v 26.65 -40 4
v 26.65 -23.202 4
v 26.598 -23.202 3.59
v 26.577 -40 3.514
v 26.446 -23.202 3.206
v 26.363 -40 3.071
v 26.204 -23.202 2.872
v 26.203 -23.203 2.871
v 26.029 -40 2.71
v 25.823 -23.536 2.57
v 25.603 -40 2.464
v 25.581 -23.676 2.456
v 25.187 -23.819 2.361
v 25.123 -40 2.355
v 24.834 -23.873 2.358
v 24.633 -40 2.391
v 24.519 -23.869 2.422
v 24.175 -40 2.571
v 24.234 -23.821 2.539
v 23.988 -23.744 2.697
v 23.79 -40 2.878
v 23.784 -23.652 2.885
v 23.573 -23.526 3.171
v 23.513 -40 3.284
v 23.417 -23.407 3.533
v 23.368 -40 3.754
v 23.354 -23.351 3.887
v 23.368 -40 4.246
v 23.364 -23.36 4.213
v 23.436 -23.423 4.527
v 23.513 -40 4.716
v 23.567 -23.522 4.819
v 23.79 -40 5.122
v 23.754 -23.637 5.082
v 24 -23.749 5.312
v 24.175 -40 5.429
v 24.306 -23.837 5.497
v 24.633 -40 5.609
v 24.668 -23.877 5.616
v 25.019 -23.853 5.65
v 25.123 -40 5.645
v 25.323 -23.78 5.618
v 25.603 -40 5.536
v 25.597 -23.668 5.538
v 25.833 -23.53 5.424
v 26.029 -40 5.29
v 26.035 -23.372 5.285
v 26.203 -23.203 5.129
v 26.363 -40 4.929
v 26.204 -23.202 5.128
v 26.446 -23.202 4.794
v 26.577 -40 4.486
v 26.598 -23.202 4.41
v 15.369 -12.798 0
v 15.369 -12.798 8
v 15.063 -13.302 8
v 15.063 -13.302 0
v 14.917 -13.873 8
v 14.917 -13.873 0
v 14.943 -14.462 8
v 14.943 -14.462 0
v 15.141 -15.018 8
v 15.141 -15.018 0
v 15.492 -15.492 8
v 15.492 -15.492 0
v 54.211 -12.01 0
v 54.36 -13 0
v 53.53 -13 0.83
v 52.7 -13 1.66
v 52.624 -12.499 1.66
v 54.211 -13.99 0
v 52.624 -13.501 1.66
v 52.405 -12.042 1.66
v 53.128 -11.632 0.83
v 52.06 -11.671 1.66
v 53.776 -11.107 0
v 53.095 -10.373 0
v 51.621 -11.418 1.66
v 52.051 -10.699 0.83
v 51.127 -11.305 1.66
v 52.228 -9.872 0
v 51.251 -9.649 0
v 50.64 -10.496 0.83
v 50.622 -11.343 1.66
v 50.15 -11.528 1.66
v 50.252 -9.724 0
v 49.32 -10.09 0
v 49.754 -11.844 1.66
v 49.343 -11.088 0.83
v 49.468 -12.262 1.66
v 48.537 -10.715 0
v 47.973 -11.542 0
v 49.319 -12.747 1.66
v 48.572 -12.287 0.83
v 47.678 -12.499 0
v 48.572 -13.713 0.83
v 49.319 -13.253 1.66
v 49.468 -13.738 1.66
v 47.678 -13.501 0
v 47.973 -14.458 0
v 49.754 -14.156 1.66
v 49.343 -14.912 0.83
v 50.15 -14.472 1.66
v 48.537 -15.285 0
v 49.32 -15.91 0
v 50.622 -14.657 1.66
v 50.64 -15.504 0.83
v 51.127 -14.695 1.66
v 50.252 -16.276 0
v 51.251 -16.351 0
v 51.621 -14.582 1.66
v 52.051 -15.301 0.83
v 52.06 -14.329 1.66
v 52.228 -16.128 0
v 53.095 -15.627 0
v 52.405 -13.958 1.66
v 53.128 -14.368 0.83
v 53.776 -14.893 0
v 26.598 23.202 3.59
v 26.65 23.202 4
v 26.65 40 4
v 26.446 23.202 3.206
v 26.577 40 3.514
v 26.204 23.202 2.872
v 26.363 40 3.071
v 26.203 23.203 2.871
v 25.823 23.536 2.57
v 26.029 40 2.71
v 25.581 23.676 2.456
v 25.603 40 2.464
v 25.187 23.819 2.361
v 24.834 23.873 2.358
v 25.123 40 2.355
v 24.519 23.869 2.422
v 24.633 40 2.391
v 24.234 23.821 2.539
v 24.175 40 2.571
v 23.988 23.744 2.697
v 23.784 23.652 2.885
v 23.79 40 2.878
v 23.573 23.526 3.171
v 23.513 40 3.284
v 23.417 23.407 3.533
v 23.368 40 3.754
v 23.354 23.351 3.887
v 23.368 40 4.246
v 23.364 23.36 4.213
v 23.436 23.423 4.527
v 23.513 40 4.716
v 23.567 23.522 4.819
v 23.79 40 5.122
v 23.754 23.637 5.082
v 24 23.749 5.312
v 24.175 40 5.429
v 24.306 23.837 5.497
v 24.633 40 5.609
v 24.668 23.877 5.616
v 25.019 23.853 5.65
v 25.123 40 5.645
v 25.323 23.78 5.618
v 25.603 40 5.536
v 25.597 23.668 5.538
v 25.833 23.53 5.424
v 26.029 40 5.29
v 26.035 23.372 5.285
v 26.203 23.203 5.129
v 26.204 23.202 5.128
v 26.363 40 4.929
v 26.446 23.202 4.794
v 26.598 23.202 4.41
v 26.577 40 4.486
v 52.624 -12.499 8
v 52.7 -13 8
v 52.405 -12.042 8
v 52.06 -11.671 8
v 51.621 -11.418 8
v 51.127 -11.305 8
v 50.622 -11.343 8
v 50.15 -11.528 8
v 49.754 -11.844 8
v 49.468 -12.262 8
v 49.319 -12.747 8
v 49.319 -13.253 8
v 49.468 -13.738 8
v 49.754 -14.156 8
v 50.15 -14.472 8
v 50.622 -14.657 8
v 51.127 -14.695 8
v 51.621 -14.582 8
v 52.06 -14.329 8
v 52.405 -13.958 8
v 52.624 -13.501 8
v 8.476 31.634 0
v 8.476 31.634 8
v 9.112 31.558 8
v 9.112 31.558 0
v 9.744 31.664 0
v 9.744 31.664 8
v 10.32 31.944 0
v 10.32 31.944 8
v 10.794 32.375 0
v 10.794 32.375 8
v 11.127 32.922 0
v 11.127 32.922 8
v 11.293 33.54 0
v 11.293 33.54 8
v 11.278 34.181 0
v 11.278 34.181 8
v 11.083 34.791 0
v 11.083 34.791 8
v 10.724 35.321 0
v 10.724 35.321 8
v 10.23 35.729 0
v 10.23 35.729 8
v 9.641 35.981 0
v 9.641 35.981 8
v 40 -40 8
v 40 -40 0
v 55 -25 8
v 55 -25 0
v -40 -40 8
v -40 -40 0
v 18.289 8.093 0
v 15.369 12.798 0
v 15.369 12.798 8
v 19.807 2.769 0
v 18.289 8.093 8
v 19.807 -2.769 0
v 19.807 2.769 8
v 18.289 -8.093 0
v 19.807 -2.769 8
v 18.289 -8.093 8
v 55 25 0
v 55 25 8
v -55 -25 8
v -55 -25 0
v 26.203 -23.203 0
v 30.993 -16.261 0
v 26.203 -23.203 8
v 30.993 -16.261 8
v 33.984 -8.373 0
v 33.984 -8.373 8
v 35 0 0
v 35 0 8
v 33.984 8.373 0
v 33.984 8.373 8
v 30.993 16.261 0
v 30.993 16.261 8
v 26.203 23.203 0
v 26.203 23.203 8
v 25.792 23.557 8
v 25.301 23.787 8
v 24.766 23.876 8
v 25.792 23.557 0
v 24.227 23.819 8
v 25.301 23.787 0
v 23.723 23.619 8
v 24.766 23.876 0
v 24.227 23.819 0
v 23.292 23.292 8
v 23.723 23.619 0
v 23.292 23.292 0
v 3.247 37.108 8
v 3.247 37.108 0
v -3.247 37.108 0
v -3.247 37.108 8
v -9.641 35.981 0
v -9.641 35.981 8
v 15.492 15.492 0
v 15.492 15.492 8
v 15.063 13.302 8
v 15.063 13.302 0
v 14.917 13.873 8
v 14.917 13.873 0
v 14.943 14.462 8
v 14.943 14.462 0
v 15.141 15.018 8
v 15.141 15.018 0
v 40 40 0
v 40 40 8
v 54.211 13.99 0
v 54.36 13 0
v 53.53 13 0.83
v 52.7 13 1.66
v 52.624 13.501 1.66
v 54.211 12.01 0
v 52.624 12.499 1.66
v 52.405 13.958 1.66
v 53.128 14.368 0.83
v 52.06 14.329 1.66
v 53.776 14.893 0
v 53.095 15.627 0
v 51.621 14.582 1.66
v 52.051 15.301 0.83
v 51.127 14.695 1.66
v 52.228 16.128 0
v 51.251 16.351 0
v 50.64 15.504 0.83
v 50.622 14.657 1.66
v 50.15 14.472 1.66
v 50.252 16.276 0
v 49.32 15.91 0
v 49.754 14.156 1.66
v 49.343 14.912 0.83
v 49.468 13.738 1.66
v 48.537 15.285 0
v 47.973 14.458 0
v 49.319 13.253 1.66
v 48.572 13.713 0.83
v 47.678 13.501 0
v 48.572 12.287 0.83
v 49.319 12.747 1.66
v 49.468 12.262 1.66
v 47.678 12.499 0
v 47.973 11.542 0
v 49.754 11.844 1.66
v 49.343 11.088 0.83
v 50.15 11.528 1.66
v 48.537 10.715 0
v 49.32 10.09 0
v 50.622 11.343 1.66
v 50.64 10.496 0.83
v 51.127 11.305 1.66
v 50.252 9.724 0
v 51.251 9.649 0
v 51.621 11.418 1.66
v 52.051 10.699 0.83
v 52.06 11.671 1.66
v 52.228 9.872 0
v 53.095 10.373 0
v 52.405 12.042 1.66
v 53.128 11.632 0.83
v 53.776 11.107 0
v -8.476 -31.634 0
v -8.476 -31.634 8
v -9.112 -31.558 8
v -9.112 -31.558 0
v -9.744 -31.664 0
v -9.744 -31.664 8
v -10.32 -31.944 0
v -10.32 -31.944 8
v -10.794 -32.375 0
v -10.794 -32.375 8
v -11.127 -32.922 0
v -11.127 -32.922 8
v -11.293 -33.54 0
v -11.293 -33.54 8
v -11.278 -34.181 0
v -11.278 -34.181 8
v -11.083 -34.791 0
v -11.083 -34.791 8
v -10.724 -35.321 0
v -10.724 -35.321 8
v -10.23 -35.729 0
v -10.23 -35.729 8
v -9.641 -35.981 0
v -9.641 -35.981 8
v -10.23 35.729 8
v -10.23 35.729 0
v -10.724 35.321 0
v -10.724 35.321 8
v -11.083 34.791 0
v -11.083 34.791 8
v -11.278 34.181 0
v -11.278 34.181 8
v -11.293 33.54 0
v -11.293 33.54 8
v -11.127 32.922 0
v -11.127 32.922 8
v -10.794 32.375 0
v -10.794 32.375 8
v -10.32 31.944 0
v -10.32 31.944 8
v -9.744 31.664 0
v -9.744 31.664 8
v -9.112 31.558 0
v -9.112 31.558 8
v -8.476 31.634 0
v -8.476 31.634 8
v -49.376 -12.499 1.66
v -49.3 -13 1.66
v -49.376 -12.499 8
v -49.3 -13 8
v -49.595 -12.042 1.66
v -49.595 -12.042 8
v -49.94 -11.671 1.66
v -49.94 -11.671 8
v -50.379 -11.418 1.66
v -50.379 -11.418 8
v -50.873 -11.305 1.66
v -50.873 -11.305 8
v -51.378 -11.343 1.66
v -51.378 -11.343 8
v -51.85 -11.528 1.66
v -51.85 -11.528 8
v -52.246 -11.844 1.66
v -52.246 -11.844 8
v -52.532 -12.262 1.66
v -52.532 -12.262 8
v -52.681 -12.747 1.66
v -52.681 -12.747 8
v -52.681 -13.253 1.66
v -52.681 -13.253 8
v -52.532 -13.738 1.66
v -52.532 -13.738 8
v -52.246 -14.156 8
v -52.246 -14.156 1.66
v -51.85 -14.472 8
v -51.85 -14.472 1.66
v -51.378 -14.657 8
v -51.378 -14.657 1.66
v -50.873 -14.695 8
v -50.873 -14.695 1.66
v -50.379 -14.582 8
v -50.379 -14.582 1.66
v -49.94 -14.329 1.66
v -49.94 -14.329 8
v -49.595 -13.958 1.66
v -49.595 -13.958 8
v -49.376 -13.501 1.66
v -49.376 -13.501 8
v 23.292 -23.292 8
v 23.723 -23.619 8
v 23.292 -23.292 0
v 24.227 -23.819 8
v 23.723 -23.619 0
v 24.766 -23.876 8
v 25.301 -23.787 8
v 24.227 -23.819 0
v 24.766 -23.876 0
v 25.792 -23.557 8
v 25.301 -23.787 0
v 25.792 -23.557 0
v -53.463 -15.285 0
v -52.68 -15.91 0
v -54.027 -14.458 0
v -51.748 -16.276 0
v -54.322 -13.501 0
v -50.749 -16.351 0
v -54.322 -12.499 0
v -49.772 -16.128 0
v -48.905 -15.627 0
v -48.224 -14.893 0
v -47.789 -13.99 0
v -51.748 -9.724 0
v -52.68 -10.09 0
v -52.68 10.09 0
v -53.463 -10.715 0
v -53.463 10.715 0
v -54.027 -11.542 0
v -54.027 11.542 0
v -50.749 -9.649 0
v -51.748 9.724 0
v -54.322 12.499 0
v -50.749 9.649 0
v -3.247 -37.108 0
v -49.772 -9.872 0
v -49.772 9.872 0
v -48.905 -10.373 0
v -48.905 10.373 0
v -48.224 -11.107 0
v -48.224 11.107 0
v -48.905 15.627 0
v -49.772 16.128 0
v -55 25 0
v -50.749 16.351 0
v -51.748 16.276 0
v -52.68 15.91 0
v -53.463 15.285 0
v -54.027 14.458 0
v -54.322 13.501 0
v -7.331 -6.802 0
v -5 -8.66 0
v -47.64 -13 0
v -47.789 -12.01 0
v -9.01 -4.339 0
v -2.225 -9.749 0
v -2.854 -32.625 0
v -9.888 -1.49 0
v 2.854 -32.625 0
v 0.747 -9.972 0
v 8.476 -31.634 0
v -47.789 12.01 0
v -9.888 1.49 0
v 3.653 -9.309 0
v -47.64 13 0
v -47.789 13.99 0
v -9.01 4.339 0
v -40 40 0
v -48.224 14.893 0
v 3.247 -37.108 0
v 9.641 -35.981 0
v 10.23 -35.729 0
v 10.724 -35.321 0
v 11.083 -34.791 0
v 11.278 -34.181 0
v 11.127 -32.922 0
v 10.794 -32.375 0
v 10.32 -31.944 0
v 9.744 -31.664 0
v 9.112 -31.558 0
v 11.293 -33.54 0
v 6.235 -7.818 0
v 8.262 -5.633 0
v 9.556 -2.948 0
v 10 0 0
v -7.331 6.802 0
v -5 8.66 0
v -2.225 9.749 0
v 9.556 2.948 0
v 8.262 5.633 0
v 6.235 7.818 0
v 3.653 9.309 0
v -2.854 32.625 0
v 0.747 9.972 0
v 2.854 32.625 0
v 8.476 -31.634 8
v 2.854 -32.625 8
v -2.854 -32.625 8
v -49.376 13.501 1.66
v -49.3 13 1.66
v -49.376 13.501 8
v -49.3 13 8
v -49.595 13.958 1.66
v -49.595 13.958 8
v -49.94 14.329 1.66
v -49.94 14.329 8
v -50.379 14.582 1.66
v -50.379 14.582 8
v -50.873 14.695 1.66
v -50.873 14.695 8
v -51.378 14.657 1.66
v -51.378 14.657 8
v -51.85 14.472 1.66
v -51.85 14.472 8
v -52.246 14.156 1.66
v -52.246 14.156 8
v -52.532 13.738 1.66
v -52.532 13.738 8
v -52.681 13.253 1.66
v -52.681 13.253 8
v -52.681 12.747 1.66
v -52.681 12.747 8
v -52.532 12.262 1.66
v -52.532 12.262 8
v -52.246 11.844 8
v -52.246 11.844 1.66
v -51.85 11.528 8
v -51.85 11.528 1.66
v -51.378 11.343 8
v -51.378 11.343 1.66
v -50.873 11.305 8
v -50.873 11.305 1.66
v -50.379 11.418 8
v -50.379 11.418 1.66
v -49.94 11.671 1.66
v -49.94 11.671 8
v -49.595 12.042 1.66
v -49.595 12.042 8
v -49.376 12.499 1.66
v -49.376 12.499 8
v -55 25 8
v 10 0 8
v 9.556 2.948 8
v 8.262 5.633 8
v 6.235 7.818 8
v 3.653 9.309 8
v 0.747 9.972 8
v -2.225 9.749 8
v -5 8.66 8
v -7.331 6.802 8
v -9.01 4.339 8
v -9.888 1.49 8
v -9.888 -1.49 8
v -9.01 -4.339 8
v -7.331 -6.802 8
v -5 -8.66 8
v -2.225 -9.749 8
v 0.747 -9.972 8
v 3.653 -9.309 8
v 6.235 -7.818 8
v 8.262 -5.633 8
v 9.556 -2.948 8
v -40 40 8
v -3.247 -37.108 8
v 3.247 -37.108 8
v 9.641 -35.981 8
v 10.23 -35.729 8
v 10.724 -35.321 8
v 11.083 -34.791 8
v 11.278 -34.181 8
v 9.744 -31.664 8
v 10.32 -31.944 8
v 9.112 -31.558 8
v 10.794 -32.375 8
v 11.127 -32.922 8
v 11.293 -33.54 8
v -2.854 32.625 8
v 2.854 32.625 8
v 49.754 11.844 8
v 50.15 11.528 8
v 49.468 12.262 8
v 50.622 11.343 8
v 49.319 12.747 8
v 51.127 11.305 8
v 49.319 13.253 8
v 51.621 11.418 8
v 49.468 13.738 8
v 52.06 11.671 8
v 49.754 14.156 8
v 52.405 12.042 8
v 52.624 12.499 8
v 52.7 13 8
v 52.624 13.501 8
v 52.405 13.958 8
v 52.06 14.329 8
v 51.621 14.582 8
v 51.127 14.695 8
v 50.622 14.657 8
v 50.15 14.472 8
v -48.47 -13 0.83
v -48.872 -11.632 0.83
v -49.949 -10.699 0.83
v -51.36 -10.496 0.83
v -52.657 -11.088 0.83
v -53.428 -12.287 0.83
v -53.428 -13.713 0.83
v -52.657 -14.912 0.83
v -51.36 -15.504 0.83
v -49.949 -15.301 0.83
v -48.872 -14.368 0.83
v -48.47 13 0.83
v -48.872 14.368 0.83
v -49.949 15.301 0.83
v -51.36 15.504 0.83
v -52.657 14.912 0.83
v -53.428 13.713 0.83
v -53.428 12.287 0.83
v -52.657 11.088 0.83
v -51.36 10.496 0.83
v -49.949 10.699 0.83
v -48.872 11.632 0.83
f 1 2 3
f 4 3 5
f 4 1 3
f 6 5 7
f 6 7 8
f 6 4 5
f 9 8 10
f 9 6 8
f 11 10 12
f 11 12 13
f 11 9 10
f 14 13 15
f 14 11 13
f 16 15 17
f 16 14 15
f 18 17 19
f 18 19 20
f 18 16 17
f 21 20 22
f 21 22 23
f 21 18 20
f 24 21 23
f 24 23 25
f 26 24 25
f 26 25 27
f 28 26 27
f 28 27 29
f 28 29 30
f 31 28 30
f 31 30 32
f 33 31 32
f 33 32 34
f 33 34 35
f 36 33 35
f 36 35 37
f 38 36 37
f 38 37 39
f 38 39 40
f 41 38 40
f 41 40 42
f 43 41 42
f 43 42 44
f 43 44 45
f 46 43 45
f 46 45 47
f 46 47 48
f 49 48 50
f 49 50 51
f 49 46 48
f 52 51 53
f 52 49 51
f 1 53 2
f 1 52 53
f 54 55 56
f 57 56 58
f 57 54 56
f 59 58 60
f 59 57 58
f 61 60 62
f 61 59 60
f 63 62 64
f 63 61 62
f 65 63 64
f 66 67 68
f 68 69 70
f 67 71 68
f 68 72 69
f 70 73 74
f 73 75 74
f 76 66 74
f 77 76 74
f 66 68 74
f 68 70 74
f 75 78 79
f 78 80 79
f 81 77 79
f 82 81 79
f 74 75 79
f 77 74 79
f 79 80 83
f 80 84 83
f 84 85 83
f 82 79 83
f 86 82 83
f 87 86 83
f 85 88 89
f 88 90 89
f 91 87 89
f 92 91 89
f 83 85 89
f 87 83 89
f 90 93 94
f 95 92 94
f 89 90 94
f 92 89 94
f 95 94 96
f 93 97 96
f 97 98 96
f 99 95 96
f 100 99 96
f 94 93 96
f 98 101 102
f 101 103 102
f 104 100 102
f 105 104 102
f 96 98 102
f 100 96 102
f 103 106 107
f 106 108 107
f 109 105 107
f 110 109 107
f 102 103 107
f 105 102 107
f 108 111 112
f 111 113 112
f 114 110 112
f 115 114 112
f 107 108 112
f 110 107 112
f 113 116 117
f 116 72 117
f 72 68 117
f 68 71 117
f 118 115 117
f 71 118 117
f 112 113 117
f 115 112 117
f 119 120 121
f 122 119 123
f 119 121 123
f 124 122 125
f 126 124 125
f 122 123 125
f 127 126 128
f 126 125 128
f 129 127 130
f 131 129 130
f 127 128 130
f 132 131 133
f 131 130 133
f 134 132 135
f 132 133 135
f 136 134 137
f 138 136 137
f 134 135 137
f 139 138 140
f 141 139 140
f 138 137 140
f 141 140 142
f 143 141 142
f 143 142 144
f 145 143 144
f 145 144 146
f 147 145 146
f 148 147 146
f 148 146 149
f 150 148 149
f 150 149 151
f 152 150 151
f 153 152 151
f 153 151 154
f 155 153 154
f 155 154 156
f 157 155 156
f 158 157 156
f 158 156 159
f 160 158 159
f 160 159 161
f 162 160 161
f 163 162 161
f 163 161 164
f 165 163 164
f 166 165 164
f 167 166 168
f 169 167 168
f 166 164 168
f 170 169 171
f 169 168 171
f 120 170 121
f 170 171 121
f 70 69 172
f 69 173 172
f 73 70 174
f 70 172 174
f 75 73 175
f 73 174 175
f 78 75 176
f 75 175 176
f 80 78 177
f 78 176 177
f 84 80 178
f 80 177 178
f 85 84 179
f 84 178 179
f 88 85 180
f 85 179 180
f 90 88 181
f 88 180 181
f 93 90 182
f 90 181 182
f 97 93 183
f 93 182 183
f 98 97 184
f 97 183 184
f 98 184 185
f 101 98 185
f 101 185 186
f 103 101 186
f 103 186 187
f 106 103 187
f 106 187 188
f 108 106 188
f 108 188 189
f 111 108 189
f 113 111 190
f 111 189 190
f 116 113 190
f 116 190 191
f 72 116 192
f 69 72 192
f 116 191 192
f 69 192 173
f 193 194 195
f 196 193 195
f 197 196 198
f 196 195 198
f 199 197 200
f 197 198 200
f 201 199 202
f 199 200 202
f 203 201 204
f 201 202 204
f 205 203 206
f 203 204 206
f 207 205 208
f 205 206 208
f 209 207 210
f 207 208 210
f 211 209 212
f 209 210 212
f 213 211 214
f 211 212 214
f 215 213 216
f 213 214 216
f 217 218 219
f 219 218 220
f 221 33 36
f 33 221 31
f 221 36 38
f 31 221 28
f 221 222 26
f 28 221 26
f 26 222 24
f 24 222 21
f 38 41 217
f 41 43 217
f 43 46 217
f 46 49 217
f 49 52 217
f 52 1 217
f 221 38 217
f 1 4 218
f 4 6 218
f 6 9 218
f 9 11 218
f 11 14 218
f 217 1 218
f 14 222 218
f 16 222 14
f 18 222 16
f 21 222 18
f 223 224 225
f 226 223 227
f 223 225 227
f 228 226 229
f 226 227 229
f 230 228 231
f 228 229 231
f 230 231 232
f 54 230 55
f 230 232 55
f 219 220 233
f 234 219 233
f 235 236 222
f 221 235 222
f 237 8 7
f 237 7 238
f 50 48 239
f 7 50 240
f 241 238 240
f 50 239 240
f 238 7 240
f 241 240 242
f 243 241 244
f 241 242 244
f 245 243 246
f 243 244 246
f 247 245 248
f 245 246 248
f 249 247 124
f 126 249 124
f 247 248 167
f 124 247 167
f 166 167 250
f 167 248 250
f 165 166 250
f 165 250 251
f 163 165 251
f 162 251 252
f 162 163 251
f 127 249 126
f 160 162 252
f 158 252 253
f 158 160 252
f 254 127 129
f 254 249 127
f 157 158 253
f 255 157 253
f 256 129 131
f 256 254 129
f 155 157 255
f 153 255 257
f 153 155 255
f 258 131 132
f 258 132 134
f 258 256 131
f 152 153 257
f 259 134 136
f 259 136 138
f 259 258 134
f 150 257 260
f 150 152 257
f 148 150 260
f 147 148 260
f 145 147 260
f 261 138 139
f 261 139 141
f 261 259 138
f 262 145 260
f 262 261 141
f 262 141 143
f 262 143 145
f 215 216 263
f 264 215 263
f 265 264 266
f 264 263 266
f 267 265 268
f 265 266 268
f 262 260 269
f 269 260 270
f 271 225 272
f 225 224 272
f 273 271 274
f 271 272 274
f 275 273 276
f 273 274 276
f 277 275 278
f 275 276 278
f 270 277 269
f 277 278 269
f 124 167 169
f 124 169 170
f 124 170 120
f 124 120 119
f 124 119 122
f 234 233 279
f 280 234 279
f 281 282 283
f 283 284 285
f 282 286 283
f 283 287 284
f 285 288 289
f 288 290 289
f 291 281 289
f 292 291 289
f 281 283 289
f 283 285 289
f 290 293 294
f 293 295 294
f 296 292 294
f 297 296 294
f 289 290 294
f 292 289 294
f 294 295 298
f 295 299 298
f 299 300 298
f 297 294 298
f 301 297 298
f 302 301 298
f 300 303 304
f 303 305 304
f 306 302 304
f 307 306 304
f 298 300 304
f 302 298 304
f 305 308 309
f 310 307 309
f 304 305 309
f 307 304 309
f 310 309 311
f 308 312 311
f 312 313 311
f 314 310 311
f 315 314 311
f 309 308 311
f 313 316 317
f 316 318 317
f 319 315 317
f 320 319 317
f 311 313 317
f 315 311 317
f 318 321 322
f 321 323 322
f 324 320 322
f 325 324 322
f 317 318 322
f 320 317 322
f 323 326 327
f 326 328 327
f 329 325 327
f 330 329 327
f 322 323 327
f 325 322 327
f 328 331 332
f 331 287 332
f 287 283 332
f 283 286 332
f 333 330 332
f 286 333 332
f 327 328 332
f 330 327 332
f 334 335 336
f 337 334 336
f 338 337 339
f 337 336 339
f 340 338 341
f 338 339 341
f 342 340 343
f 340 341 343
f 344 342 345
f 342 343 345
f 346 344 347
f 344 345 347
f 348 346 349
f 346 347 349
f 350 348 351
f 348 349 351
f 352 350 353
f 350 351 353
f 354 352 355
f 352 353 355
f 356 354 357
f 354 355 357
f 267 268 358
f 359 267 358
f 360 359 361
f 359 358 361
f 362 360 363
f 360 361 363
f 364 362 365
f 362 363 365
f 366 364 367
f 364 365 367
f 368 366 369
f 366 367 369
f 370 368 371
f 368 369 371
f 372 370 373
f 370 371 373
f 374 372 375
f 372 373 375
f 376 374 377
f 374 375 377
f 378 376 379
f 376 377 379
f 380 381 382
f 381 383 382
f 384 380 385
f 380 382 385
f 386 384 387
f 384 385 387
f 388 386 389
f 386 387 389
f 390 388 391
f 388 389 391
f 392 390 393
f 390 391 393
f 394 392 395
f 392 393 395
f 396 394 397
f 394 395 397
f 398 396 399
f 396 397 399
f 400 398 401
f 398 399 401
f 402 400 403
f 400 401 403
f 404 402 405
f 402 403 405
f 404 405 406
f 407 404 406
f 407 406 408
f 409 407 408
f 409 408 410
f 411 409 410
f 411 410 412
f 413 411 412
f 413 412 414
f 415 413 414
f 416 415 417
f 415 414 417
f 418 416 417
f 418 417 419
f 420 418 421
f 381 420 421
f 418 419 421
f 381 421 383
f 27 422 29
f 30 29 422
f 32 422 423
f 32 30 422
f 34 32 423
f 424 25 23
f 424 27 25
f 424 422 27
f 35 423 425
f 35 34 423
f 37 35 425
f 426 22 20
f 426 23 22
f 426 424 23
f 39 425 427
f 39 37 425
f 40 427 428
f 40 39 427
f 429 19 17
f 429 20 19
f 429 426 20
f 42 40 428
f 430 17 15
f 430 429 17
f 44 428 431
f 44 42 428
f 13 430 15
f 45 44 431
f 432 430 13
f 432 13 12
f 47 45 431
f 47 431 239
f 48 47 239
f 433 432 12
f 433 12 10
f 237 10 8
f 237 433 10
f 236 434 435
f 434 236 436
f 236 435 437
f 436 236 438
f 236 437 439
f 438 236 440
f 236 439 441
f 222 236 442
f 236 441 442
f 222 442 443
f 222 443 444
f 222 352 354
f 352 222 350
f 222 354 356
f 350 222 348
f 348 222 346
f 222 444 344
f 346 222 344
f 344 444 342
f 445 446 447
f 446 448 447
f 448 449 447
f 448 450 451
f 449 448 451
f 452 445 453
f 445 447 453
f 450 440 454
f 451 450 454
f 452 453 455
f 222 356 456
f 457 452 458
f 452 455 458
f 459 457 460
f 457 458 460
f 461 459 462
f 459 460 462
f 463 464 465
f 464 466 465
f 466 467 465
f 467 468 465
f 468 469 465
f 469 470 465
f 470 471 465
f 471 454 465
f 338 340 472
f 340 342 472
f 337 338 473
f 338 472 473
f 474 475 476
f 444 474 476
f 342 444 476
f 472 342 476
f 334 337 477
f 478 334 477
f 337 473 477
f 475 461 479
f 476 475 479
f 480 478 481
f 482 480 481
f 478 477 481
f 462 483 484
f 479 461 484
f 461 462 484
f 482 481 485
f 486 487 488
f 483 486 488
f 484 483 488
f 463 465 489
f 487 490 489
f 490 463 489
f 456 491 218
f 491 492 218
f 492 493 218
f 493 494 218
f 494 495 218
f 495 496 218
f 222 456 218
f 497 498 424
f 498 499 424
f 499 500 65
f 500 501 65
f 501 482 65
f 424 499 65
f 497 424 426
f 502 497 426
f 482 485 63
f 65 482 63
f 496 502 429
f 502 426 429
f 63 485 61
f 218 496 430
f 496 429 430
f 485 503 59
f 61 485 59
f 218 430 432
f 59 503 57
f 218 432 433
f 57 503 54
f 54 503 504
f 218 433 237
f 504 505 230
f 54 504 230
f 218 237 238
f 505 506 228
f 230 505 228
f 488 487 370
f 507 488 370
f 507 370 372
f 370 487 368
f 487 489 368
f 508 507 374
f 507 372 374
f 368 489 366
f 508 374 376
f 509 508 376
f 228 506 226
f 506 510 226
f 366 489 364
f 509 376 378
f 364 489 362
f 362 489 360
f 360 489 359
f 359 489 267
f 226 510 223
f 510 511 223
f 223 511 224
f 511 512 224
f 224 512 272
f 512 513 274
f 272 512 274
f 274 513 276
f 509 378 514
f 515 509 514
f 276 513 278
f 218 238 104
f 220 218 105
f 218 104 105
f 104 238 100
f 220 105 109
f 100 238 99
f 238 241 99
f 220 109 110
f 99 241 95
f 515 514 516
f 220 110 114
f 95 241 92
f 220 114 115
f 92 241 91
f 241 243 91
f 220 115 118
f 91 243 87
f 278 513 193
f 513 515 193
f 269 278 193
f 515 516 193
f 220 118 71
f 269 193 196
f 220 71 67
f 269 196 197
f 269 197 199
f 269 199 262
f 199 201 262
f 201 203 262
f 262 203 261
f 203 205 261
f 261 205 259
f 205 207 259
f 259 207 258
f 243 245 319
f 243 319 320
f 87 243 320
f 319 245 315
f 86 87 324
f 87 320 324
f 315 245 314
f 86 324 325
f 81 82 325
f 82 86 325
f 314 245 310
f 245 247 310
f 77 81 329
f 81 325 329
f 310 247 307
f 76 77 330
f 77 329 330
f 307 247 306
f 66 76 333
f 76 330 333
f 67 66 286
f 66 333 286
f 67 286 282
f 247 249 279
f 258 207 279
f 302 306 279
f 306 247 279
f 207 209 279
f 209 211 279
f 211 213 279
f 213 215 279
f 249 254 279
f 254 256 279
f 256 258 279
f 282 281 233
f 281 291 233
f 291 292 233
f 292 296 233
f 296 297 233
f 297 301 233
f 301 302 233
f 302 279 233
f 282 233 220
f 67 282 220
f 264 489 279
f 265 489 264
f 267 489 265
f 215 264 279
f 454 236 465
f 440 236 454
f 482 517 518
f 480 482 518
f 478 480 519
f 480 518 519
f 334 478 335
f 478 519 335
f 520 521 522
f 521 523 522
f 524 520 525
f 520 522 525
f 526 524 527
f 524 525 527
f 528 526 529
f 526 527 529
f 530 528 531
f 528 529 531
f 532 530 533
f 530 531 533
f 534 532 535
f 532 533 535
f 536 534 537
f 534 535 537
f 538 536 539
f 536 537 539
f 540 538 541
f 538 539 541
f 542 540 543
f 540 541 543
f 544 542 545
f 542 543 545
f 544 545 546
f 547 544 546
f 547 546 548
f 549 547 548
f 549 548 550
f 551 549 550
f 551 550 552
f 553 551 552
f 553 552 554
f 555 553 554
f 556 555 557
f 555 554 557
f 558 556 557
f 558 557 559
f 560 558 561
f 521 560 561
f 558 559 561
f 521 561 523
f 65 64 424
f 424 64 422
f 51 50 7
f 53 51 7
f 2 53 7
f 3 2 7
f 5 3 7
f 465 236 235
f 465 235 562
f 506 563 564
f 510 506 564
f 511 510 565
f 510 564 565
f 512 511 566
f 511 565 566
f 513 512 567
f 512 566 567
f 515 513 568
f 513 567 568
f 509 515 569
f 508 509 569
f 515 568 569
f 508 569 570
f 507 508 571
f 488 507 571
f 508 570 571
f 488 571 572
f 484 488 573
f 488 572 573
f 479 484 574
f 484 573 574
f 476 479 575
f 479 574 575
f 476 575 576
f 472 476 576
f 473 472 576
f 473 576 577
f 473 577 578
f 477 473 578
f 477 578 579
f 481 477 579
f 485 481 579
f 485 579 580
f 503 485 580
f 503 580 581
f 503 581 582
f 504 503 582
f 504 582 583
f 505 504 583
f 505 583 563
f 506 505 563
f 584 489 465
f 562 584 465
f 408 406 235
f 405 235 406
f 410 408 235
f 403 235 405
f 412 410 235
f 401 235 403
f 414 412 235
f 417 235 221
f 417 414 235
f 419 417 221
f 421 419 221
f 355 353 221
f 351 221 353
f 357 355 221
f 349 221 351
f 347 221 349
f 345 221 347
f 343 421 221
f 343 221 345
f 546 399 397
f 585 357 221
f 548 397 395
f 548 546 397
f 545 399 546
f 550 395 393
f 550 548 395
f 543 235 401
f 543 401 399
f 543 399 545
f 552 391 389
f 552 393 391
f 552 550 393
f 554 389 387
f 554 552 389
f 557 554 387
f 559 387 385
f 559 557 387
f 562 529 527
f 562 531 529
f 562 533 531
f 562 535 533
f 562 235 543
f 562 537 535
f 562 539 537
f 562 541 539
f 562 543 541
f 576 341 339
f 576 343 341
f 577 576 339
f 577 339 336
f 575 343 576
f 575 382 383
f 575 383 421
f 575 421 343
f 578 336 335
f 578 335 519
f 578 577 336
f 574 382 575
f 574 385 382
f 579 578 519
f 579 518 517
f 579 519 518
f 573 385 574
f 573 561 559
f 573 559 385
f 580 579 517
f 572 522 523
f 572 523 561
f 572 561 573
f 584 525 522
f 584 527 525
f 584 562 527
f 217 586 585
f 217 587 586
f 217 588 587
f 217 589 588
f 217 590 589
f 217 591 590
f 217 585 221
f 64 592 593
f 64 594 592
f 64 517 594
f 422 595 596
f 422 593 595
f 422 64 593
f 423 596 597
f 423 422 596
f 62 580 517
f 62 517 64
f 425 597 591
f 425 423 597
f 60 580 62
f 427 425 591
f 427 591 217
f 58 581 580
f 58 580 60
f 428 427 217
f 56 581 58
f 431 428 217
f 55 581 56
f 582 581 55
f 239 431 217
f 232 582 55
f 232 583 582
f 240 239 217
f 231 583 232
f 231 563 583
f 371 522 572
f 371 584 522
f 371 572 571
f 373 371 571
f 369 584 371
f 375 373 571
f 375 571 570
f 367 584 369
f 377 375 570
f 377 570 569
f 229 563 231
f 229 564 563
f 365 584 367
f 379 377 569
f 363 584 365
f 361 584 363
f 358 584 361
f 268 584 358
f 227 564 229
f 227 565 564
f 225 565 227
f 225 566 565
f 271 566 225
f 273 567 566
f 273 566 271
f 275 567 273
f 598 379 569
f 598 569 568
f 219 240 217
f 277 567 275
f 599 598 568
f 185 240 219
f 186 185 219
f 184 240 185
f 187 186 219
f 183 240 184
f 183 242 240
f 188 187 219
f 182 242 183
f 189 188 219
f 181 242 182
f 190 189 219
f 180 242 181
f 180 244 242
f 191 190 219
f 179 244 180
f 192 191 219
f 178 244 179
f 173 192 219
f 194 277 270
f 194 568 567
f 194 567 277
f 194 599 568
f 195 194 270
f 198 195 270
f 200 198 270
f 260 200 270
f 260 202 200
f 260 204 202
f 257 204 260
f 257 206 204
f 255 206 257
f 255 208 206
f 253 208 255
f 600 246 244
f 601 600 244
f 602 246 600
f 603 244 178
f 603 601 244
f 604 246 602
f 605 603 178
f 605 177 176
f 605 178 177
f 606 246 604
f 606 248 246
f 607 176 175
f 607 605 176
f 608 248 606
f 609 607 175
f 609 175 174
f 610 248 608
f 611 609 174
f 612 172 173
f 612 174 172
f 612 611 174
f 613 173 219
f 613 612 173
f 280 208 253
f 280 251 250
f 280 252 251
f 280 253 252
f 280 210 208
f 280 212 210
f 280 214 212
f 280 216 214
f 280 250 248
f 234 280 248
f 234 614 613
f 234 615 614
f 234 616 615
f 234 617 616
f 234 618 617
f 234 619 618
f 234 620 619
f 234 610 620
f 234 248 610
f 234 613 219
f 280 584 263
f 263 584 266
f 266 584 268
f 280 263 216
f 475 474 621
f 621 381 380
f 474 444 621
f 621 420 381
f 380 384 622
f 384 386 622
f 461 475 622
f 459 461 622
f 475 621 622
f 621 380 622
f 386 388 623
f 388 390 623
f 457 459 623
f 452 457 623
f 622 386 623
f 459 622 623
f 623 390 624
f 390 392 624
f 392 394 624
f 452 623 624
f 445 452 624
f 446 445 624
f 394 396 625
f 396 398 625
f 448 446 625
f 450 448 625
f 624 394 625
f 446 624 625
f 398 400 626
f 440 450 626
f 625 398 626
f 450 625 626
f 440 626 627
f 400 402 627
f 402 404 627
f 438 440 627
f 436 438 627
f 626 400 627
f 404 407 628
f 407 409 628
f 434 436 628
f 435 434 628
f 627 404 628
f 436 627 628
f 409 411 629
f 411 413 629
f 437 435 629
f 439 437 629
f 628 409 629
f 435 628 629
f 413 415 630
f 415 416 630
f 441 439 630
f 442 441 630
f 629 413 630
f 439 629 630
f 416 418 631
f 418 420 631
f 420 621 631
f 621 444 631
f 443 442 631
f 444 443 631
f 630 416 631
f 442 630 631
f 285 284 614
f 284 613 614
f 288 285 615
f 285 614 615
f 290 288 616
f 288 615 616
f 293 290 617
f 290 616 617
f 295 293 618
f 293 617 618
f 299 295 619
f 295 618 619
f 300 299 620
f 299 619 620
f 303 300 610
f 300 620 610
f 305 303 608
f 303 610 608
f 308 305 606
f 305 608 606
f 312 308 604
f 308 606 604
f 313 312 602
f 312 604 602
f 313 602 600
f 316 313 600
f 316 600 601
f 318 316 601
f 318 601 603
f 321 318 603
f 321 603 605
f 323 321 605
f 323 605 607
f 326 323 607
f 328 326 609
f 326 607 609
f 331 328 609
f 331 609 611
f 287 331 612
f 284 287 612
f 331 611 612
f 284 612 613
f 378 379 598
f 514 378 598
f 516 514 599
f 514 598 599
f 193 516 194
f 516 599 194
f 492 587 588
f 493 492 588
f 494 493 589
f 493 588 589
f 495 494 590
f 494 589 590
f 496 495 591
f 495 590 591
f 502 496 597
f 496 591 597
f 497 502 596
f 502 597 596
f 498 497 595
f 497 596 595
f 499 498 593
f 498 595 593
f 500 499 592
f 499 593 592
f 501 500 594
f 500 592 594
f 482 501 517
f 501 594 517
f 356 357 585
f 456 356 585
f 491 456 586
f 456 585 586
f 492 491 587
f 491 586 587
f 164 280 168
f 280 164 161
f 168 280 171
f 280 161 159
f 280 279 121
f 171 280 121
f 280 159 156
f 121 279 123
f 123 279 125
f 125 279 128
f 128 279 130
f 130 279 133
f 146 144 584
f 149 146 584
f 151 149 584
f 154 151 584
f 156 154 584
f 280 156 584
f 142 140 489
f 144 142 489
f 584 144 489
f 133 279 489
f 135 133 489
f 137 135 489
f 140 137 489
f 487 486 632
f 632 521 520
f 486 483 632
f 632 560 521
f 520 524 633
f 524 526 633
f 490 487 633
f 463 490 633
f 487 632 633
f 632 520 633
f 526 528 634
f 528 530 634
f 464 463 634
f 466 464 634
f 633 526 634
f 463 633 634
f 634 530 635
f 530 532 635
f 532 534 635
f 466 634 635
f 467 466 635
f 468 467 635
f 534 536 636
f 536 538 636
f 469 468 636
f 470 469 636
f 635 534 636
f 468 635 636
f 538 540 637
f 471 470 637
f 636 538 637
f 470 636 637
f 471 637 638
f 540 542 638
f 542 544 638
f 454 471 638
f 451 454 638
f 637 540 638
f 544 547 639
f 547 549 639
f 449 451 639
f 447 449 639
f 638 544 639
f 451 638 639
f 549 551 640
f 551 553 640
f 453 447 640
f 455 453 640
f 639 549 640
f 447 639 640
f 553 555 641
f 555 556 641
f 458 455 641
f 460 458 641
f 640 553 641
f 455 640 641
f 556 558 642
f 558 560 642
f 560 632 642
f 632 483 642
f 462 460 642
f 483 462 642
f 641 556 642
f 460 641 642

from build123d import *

# Parameters (mm, degrees)
SKETCH_1_W                   = 80
SKETCH_1_H                   = 14.999999944
SKETCH_1_H_2                 = 50
SKETCH_1_W_2                 = 14.999999944
SKETCH_1_W_3                 = 15.000000056
EXTRUDE_1_DEPTH              = 8
AXISHOLE_REACH               = 70.476
SKETCH_2_R                   = 10
LOCKINGSLOT_REACH            = 70.476
ADJUSTSLOT_REACH             = 70.476
FILLET_1_R                   = 2
HOLE_START                   = -39.999999944
HOLE_WIZARD_M4_1_OUTLINE_R   = 1.65
HOLE_WIZARD_M4_1_DEPTH       = 16.797680198
HOLE_WIZARD_M3_1_D           = 3.4
HOLE_WIZARD_M3_1_CSINK_D     = 6.72
HOLE_WIZARD_M3_1_CSINK_ANGLE = 90


# Read off the part's stored shape, not the designer's step: M4 나사 구멍1
with BuildPart() as part:
    # 스케치1 → 보스-돌출1 (new body)
    with BuildSketch(Plane.XY):
        with Locations((-5.6e-08, -32.499999972)):
            Rectangle(SKETCH_1_W, SKETCH_1_H)
        with Locations((-5.6e-08, 0)):
            Rectangle(SKETCH_1_W, SKETCH_1_H_2)
        Polygon((39.999999944, 39.999999832), (-40.000000056, 40.000000056), (-40.000000056, 25), (39.999999944, 25), align=None)
        with Locations((47.499999916, 0)):
            Rectangle(SKETCH_1_W_2, SKETCH_1_H_2)
        with Locations((-47.500000084, 0)):
            Rectangle(SKETCH_1_W_3, SKETCH_1_H_2)
        Polygon((-40.000000056, -25), (-55.000000112, -25), (-40.000000056, -39.999999944), align=None)
        Polygon((54.999999888, -25), (39.999999944, -25), (39.999999944, -39.999999944), align=None)
        Polygon((54.999999888, 25), (39.999999944, 39.999999832), (39.999999944, 25), align=None)
        Polygon((-40.000000056, 25), (-40.000000056, 40.000000056), (-55.000000112, 25), align=None)
    extrude(amount=EXTRUDE_1_DEPTH)

    # 스케치2 → AXISHOLE (cut, up to next)
    with BuildSketch(Plane.XY.offset(8), mode=Mode.PRIVATE) as axishole_sk1:
        Circle(SKETCH_2_R)
    axishole_tool1 = extrude(axishole_sk1.sketch, amount=-AXISHOLE_REACH, mode=Mode.PRIVATE) & part.part
    add(axishole_tool1.solids().sort_by_distance((0, 0, 8))[0], mode=Mode.SUBTRACT)

    # 스케치3 → LOCKINGSLOT (cut, up to next)
    with BuildSketch(Plane.XY.offset(8), mode=Mode.PRIVATE) as lockingslot_sk1:
        with BuildLine():
            ThreePointArc((-9.64100943, -35.980737029), (0, -37.25), (9.64100943, -35.980737029))
            ThreePointArc((9.64100943, -35.980737029), (11.231999688, -33.225061069), (8.476323727, -31.634070811))
            ThreePointArc((8.476323727, -31.634070811), (0, -32.75), (-8.476323727, -31.634070811))
            ThreePointArc((-8.476323727, -31.634070811), (-11.231999688, -33.225061069), (-9.64100943, -35.980737029))
        make_face()
    lockingslot_tool1 = extrude(lockingslot_sk1.sketch, amount=-LOCKINGSLOT_REACH, mode=Mode.PRIVATE) & part.part
    # 스케치3 → LOCKINGSLOT (cut, up to next)
    with BuildSketch(Plane.XY.offset(8), mode=Mode.PRIVATE) as lockingslot_sk2:
        with BuildLine():
            ThreePointArc((9.64100943, 35.980737029), (0, 37.25), (-9.64100943, 35.980737029))
            ThreePointArc((-9.64100943, 35.980737029), (-11.231999688, 33.225061069), (-8.476323727, 31.634070811))
            ThreePointArc((-8.476323727, 31.634070811), (0, 32.75), (8.476323727, 31.634070811))
            ThreePointArc((8.476323727, 31.634070811), (11.231999688, 33.225061069), (9.64100943, 35.980737029))
        make_face()
    lockingslot_tool2 = extrude(lockingslot_sk2.sketch, amount=-LOCKINGSLOT_REACH, mode=Mode.PRIVATE) & part.part
    add(lockingslot_tool1.solids().sort_by_distance((0, -34.473161, 8))[0], mode=Mode.SUBTRACT)
    add(lockingslot_tool2.solids().sort_by_distance((0, 34.473161, 8))[0], mode=Mode.SUBTRACT)

    # 스케치4 → ADJUSTSLOT (cut, up to next)
    with BuildSketch(Plane.XY.offset(8), mode=Mode.PRIVATE) as adjustslot_sk1:
        with BuildLine():
            Line((24.748737262, 24.748737262), (14.142135545, 14.142135545))
            ThreePointArc((14.142135545, 14.142135545), (19.999999888, 0), (14.142135545, -14.142135545))
            Line((14.142135545, -14.142135545), (24.748737262, -24.748737262))
            ThreePointArc((24.748737262, -24.748737262), (34.999999888, 0), (24.748737262, 24.748737262))
        make_face()
    adjustslot_tool1 = extrude(adjustslot_sk1.sketch, amount=-ADJUSTSLOT_REACH, mode=Mode.PRIVATE) & part.part
    add(adjustslot_tool1.solids().sort_by_distance((25.372551, 0, 8))[0], mode=Mode.SUBTRACT)

    # 필렛1
    fillet_1_edges = [part.edges().sort_by_distance(p)[0] for p in [
        (24.748737262, 24.748737262, 4),
        (24.748737262, -24.748737262, 4),
        (14.142135545, -14.142135545, 4),
        (14.142135545, 14.142135545, 4),
    ]]
    fillet(fillet_1_edges, radius=FILLET_1_R)

    # M4 나사 구멍1 outline → M4 나사 구멍1 (cut)
    with BuildSketch(Plane(origin=(0, 0, 0), x_dir=(1, 0, 0), z_dir=(0, 1, 0)).offset(HOLE_START)):
        with Locations((24.999999888, -4)):
            Circle(HOLE_WIZARD_M4_1_OUTLINE_R)
    hole_wizard_m4_1 = extrude(amount=HOLE_WIZARD_M4_1_DEPTH, mode=Mode.SUBTRACT)

    # 대칭 복사1: M4 나사 구멍1 across plane
    add(hole_wizard_m4_1.mirror(Plane(origin=(0, 0, 0), x_dir=(0, 0, 1), z_dir=(-1.3990850145084723e-09, -1.0, 0))), mode=Mode.SUBTRACT)

    # M3 육각 소켓 접시 머리 캡 나사용 카운터싱크1 (through all)
    with Locations(Plane(origin=(0, 0, 0), x_dir=(-1, 0, 0), z_dir=(0, 0, -1))):
        with Locations((51.000000112, -13), (51.000000112, 13), (-51.000000112, -13), (-51.000000112, 13)):
            CounterSinkHole(HOLE_WIZARD_M3_1_D / 2, HOLE_WIZARD_M3_1_CSINK_D / 2, counter_sink_angle=HOLE_WIZARD_M3_1_CSINK_ANGLE)


solid = part.part
